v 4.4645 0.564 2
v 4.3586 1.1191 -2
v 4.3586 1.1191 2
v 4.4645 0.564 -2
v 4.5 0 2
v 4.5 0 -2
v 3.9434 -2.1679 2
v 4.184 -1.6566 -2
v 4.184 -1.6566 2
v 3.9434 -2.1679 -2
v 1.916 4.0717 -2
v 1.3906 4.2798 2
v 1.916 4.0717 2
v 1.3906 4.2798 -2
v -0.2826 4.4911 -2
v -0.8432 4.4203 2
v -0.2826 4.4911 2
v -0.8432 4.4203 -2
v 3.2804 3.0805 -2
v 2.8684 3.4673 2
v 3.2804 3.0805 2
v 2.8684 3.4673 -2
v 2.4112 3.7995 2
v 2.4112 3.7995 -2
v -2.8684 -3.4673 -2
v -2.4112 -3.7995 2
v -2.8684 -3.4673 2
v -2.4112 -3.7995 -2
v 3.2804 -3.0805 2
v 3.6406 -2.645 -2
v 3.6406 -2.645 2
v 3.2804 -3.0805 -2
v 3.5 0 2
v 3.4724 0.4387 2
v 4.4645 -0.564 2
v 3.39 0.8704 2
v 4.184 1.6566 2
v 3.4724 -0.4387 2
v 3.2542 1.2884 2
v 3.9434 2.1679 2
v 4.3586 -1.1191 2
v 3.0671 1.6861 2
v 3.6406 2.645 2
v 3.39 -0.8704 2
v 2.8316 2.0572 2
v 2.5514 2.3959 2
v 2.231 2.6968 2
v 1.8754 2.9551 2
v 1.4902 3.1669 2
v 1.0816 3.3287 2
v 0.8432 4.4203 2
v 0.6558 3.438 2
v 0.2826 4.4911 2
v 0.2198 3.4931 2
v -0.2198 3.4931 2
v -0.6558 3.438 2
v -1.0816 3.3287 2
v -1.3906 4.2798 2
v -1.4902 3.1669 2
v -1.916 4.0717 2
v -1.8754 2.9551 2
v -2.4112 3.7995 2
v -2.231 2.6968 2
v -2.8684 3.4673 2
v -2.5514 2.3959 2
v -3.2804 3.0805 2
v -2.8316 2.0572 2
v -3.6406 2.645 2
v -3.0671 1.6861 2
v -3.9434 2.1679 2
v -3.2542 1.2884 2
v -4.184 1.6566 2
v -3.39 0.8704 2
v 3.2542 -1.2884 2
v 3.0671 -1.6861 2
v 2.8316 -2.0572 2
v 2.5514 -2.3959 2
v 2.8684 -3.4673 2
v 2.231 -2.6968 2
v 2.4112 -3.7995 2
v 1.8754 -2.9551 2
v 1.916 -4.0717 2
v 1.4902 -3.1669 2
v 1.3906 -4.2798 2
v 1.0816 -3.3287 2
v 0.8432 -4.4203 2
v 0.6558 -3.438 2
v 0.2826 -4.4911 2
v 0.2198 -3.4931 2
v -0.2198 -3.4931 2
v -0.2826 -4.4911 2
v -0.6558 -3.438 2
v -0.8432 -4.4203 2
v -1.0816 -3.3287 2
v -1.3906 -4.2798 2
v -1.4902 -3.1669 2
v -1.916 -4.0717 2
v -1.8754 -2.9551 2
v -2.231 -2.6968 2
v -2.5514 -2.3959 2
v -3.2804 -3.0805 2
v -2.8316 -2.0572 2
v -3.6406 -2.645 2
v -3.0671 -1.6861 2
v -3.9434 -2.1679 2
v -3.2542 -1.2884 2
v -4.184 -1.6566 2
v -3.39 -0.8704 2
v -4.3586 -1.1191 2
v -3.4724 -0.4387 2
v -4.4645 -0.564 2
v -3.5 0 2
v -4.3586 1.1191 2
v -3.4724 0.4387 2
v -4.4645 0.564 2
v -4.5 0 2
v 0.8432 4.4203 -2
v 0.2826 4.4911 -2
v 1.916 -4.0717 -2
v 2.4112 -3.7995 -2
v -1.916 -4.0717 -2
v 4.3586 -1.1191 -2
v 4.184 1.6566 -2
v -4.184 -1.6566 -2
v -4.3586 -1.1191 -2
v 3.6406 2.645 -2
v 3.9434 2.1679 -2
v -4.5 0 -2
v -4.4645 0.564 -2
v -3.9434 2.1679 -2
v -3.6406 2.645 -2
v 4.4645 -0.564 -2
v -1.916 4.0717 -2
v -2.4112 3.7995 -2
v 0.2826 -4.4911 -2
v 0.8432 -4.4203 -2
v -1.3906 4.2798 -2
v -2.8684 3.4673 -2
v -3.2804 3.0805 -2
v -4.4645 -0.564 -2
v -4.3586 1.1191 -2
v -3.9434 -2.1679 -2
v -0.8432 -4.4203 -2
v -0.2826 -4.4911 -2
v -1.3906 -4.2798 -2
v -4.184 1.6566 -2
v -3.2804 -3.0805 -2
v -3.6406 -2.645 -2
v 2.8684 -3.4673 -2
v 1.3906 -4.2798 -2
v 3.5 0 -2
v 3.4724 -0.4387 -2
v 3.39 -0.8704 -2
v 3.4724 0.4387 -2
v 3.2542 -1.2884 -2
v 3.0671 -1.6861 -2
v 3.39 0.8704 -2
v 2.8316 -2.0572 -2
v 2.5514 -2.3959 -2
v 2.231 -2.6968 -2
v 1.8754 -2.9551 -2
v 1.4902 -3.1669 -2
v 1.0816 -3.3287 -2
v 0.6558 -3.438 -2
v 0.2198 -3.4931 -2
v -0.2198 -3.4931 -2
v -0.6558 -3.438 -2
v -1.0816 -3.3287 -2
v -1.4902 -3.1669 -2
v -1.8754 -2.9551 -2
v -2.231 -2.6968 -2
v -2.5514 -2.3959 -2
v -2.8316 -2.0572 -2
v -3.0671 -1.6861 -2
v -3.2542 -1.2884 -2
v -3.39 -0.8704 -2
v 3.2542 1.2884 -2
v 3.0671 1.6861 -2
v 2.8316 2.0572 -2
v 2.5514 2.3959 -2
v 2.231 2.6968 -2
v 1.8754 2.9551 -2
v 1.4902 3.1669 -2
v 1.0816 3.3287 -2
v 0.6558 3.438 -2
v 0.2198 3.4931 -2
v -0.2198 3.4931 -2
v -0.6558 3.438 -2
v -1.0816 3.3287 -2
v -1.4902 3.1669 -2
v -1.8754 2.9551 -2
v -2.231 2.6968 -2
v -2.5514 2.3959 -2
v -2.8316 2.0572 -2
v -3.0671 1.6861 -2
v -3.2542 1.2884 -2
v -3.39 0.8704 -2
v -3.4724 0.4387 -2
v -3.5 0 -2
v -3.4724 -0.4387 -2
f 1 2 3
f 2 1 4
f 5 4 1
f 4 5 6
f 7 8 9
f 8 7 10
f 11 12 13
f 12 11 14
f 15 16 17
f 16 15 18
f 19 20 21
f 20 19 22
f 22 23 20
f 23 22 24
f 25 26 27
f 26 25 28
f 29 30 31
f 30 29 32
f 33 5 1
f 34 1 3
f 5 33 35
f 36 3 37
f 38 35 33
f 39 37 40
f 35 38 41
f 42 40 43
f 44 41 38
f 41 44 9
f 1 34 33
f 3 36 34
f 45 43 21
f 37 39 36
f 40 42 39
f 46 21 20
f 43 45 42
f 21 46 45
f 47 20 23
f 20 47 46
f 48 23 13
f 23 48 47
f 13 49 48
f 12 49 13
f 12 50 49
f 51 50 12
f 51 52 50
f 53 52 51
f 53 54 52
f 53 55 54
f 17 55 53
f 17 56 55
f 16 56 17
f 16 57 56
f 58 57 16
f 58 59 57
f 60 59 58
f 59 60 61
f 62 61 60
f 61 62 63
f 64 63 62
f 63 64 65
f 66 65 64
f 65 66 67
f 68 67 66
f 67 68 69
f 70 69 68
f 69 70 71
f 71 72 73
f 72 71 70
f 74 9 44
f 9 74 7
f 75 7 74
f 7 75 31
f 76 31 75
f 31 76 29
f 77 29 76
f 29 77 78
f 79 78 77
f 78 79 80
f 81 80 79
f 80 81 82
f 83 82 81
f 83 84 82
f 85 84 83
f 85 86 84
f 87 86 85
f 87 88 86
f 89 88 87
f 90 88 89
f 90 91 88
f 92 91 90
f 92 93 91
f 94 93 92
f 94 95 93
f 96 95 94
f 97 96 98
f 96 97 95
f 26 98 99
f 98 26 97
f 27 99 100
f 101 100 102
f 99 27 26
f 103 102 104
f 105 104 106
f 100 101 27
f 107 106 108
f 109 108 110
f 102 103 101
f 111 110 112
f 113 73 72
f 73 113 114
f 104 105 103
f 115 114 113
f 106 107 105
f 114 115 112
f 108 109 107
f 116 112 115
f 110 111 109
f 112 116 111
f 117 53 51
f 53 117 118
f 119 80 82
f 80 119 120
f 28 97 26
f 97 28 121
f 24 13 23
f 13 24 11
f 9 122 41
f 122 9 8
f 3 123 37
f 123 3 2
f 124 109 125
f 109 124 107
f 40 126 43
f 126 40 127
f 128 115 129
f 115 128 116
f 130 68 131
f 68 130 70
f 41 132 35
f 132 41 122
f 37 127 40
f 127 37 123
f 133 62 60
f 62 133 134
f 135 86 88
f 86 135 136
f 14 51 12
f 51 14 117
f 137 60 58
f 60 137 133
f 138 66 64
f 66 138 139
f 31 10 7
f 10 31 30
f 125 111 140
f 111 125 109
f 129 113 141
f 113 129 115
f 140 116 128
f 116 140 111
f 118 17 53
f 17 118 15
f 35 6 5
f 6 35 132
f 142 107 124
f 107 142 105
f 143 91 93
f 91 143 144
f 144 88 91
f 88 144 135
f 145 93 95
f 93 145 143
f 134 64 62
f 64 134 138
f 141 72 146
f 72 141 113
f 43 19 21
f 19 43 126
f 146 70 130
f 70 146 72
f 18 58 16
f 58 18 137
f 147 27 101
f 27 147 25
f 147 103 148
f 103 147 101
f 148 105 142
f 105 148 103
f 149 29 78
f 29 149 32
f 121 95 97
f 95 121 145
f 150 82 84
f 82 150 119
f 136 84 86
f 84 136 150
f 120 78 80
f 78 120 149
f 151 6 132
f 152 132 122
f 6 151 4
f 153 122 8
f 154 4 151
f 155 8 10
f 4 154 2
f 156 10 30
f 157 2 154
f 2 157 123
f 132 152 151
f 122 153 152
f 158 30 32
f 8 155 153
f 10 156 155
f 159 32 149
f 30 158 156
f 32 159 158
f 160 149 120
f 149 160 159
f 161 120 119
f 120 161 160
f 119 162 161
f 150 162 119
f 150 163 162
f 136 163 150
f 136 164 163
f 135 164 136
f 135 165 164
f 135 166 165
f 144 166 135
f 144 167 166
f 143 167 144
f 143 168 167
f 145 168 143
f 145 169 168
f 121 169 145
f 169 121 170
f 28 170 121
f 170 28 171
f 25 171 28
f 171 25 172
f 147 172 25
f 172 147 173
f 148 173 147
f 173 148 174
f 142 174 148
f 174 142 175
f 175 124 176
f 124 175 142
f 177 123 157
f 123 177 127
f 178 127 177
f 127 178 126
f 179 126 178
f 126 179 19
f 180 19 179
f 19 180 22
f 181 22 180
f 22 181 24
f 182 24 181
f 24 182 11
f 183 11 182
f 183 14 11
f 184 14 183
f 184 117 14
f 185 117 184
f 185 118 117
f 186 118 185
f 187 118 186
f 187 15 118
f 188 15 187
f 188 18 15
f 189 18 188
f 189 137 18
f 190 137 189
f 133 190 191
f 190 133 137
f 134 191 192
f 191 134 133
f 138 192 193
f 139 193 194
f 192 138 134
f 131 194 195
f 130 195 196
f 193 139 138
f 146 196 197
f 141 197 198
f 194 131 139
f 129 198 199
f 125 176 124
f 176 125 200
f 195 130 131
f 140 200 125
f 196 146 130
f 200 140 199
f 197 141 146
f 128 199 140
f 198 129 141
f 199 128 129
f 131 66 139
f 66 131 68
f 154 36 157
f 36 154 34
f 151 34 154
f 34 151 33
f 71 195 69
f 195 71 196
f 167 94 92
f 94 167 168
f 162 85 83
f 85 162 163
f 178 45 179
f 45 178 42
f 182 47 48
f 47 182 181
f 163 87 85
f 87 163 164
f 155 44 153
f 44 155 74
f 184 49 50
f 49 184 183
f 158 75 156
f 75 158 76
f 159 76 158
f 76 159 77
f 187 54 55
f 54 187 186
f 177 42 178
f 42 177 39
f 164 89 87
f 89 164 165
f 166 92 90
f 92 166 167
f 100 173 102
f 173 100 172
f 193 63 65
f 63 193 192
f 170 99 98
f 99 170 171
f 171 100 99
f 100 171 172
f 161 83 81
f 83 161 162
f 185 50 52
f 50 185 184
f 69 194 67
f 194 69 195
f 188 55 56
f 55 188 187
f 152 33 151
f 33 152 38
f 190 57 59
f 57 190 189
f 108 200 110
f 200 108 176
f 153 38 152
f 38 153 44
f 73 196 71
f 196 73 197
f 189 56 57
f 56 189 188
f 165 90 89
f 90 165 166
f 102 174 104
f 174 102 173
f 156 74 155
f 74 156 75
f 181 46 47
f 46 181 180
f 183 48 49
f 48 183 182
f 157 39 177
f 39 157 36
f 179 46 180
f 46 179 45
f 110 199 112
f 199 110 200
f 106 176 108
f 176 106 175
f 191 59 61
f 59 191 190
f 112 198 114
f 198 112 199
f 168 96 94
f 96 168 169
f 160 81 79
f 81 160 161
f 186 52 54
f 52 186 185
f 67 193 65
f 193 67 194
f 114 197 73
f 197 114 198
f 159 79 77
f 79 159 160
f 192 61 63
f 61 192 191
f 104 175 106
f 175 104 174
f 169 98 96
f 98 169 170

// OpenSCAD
$fn = 50;


difference() {
	union() {
		translate(v = [0, 0, -2.0000000000]) {
			cylinder(h = 4, r = 4.5000000000);
		}
	}
	union() {
		translate(v = [0, 0, -100.0000000000]) {
			cylinder(h = 200, r = 3.5000000000);
		}
	}
}
